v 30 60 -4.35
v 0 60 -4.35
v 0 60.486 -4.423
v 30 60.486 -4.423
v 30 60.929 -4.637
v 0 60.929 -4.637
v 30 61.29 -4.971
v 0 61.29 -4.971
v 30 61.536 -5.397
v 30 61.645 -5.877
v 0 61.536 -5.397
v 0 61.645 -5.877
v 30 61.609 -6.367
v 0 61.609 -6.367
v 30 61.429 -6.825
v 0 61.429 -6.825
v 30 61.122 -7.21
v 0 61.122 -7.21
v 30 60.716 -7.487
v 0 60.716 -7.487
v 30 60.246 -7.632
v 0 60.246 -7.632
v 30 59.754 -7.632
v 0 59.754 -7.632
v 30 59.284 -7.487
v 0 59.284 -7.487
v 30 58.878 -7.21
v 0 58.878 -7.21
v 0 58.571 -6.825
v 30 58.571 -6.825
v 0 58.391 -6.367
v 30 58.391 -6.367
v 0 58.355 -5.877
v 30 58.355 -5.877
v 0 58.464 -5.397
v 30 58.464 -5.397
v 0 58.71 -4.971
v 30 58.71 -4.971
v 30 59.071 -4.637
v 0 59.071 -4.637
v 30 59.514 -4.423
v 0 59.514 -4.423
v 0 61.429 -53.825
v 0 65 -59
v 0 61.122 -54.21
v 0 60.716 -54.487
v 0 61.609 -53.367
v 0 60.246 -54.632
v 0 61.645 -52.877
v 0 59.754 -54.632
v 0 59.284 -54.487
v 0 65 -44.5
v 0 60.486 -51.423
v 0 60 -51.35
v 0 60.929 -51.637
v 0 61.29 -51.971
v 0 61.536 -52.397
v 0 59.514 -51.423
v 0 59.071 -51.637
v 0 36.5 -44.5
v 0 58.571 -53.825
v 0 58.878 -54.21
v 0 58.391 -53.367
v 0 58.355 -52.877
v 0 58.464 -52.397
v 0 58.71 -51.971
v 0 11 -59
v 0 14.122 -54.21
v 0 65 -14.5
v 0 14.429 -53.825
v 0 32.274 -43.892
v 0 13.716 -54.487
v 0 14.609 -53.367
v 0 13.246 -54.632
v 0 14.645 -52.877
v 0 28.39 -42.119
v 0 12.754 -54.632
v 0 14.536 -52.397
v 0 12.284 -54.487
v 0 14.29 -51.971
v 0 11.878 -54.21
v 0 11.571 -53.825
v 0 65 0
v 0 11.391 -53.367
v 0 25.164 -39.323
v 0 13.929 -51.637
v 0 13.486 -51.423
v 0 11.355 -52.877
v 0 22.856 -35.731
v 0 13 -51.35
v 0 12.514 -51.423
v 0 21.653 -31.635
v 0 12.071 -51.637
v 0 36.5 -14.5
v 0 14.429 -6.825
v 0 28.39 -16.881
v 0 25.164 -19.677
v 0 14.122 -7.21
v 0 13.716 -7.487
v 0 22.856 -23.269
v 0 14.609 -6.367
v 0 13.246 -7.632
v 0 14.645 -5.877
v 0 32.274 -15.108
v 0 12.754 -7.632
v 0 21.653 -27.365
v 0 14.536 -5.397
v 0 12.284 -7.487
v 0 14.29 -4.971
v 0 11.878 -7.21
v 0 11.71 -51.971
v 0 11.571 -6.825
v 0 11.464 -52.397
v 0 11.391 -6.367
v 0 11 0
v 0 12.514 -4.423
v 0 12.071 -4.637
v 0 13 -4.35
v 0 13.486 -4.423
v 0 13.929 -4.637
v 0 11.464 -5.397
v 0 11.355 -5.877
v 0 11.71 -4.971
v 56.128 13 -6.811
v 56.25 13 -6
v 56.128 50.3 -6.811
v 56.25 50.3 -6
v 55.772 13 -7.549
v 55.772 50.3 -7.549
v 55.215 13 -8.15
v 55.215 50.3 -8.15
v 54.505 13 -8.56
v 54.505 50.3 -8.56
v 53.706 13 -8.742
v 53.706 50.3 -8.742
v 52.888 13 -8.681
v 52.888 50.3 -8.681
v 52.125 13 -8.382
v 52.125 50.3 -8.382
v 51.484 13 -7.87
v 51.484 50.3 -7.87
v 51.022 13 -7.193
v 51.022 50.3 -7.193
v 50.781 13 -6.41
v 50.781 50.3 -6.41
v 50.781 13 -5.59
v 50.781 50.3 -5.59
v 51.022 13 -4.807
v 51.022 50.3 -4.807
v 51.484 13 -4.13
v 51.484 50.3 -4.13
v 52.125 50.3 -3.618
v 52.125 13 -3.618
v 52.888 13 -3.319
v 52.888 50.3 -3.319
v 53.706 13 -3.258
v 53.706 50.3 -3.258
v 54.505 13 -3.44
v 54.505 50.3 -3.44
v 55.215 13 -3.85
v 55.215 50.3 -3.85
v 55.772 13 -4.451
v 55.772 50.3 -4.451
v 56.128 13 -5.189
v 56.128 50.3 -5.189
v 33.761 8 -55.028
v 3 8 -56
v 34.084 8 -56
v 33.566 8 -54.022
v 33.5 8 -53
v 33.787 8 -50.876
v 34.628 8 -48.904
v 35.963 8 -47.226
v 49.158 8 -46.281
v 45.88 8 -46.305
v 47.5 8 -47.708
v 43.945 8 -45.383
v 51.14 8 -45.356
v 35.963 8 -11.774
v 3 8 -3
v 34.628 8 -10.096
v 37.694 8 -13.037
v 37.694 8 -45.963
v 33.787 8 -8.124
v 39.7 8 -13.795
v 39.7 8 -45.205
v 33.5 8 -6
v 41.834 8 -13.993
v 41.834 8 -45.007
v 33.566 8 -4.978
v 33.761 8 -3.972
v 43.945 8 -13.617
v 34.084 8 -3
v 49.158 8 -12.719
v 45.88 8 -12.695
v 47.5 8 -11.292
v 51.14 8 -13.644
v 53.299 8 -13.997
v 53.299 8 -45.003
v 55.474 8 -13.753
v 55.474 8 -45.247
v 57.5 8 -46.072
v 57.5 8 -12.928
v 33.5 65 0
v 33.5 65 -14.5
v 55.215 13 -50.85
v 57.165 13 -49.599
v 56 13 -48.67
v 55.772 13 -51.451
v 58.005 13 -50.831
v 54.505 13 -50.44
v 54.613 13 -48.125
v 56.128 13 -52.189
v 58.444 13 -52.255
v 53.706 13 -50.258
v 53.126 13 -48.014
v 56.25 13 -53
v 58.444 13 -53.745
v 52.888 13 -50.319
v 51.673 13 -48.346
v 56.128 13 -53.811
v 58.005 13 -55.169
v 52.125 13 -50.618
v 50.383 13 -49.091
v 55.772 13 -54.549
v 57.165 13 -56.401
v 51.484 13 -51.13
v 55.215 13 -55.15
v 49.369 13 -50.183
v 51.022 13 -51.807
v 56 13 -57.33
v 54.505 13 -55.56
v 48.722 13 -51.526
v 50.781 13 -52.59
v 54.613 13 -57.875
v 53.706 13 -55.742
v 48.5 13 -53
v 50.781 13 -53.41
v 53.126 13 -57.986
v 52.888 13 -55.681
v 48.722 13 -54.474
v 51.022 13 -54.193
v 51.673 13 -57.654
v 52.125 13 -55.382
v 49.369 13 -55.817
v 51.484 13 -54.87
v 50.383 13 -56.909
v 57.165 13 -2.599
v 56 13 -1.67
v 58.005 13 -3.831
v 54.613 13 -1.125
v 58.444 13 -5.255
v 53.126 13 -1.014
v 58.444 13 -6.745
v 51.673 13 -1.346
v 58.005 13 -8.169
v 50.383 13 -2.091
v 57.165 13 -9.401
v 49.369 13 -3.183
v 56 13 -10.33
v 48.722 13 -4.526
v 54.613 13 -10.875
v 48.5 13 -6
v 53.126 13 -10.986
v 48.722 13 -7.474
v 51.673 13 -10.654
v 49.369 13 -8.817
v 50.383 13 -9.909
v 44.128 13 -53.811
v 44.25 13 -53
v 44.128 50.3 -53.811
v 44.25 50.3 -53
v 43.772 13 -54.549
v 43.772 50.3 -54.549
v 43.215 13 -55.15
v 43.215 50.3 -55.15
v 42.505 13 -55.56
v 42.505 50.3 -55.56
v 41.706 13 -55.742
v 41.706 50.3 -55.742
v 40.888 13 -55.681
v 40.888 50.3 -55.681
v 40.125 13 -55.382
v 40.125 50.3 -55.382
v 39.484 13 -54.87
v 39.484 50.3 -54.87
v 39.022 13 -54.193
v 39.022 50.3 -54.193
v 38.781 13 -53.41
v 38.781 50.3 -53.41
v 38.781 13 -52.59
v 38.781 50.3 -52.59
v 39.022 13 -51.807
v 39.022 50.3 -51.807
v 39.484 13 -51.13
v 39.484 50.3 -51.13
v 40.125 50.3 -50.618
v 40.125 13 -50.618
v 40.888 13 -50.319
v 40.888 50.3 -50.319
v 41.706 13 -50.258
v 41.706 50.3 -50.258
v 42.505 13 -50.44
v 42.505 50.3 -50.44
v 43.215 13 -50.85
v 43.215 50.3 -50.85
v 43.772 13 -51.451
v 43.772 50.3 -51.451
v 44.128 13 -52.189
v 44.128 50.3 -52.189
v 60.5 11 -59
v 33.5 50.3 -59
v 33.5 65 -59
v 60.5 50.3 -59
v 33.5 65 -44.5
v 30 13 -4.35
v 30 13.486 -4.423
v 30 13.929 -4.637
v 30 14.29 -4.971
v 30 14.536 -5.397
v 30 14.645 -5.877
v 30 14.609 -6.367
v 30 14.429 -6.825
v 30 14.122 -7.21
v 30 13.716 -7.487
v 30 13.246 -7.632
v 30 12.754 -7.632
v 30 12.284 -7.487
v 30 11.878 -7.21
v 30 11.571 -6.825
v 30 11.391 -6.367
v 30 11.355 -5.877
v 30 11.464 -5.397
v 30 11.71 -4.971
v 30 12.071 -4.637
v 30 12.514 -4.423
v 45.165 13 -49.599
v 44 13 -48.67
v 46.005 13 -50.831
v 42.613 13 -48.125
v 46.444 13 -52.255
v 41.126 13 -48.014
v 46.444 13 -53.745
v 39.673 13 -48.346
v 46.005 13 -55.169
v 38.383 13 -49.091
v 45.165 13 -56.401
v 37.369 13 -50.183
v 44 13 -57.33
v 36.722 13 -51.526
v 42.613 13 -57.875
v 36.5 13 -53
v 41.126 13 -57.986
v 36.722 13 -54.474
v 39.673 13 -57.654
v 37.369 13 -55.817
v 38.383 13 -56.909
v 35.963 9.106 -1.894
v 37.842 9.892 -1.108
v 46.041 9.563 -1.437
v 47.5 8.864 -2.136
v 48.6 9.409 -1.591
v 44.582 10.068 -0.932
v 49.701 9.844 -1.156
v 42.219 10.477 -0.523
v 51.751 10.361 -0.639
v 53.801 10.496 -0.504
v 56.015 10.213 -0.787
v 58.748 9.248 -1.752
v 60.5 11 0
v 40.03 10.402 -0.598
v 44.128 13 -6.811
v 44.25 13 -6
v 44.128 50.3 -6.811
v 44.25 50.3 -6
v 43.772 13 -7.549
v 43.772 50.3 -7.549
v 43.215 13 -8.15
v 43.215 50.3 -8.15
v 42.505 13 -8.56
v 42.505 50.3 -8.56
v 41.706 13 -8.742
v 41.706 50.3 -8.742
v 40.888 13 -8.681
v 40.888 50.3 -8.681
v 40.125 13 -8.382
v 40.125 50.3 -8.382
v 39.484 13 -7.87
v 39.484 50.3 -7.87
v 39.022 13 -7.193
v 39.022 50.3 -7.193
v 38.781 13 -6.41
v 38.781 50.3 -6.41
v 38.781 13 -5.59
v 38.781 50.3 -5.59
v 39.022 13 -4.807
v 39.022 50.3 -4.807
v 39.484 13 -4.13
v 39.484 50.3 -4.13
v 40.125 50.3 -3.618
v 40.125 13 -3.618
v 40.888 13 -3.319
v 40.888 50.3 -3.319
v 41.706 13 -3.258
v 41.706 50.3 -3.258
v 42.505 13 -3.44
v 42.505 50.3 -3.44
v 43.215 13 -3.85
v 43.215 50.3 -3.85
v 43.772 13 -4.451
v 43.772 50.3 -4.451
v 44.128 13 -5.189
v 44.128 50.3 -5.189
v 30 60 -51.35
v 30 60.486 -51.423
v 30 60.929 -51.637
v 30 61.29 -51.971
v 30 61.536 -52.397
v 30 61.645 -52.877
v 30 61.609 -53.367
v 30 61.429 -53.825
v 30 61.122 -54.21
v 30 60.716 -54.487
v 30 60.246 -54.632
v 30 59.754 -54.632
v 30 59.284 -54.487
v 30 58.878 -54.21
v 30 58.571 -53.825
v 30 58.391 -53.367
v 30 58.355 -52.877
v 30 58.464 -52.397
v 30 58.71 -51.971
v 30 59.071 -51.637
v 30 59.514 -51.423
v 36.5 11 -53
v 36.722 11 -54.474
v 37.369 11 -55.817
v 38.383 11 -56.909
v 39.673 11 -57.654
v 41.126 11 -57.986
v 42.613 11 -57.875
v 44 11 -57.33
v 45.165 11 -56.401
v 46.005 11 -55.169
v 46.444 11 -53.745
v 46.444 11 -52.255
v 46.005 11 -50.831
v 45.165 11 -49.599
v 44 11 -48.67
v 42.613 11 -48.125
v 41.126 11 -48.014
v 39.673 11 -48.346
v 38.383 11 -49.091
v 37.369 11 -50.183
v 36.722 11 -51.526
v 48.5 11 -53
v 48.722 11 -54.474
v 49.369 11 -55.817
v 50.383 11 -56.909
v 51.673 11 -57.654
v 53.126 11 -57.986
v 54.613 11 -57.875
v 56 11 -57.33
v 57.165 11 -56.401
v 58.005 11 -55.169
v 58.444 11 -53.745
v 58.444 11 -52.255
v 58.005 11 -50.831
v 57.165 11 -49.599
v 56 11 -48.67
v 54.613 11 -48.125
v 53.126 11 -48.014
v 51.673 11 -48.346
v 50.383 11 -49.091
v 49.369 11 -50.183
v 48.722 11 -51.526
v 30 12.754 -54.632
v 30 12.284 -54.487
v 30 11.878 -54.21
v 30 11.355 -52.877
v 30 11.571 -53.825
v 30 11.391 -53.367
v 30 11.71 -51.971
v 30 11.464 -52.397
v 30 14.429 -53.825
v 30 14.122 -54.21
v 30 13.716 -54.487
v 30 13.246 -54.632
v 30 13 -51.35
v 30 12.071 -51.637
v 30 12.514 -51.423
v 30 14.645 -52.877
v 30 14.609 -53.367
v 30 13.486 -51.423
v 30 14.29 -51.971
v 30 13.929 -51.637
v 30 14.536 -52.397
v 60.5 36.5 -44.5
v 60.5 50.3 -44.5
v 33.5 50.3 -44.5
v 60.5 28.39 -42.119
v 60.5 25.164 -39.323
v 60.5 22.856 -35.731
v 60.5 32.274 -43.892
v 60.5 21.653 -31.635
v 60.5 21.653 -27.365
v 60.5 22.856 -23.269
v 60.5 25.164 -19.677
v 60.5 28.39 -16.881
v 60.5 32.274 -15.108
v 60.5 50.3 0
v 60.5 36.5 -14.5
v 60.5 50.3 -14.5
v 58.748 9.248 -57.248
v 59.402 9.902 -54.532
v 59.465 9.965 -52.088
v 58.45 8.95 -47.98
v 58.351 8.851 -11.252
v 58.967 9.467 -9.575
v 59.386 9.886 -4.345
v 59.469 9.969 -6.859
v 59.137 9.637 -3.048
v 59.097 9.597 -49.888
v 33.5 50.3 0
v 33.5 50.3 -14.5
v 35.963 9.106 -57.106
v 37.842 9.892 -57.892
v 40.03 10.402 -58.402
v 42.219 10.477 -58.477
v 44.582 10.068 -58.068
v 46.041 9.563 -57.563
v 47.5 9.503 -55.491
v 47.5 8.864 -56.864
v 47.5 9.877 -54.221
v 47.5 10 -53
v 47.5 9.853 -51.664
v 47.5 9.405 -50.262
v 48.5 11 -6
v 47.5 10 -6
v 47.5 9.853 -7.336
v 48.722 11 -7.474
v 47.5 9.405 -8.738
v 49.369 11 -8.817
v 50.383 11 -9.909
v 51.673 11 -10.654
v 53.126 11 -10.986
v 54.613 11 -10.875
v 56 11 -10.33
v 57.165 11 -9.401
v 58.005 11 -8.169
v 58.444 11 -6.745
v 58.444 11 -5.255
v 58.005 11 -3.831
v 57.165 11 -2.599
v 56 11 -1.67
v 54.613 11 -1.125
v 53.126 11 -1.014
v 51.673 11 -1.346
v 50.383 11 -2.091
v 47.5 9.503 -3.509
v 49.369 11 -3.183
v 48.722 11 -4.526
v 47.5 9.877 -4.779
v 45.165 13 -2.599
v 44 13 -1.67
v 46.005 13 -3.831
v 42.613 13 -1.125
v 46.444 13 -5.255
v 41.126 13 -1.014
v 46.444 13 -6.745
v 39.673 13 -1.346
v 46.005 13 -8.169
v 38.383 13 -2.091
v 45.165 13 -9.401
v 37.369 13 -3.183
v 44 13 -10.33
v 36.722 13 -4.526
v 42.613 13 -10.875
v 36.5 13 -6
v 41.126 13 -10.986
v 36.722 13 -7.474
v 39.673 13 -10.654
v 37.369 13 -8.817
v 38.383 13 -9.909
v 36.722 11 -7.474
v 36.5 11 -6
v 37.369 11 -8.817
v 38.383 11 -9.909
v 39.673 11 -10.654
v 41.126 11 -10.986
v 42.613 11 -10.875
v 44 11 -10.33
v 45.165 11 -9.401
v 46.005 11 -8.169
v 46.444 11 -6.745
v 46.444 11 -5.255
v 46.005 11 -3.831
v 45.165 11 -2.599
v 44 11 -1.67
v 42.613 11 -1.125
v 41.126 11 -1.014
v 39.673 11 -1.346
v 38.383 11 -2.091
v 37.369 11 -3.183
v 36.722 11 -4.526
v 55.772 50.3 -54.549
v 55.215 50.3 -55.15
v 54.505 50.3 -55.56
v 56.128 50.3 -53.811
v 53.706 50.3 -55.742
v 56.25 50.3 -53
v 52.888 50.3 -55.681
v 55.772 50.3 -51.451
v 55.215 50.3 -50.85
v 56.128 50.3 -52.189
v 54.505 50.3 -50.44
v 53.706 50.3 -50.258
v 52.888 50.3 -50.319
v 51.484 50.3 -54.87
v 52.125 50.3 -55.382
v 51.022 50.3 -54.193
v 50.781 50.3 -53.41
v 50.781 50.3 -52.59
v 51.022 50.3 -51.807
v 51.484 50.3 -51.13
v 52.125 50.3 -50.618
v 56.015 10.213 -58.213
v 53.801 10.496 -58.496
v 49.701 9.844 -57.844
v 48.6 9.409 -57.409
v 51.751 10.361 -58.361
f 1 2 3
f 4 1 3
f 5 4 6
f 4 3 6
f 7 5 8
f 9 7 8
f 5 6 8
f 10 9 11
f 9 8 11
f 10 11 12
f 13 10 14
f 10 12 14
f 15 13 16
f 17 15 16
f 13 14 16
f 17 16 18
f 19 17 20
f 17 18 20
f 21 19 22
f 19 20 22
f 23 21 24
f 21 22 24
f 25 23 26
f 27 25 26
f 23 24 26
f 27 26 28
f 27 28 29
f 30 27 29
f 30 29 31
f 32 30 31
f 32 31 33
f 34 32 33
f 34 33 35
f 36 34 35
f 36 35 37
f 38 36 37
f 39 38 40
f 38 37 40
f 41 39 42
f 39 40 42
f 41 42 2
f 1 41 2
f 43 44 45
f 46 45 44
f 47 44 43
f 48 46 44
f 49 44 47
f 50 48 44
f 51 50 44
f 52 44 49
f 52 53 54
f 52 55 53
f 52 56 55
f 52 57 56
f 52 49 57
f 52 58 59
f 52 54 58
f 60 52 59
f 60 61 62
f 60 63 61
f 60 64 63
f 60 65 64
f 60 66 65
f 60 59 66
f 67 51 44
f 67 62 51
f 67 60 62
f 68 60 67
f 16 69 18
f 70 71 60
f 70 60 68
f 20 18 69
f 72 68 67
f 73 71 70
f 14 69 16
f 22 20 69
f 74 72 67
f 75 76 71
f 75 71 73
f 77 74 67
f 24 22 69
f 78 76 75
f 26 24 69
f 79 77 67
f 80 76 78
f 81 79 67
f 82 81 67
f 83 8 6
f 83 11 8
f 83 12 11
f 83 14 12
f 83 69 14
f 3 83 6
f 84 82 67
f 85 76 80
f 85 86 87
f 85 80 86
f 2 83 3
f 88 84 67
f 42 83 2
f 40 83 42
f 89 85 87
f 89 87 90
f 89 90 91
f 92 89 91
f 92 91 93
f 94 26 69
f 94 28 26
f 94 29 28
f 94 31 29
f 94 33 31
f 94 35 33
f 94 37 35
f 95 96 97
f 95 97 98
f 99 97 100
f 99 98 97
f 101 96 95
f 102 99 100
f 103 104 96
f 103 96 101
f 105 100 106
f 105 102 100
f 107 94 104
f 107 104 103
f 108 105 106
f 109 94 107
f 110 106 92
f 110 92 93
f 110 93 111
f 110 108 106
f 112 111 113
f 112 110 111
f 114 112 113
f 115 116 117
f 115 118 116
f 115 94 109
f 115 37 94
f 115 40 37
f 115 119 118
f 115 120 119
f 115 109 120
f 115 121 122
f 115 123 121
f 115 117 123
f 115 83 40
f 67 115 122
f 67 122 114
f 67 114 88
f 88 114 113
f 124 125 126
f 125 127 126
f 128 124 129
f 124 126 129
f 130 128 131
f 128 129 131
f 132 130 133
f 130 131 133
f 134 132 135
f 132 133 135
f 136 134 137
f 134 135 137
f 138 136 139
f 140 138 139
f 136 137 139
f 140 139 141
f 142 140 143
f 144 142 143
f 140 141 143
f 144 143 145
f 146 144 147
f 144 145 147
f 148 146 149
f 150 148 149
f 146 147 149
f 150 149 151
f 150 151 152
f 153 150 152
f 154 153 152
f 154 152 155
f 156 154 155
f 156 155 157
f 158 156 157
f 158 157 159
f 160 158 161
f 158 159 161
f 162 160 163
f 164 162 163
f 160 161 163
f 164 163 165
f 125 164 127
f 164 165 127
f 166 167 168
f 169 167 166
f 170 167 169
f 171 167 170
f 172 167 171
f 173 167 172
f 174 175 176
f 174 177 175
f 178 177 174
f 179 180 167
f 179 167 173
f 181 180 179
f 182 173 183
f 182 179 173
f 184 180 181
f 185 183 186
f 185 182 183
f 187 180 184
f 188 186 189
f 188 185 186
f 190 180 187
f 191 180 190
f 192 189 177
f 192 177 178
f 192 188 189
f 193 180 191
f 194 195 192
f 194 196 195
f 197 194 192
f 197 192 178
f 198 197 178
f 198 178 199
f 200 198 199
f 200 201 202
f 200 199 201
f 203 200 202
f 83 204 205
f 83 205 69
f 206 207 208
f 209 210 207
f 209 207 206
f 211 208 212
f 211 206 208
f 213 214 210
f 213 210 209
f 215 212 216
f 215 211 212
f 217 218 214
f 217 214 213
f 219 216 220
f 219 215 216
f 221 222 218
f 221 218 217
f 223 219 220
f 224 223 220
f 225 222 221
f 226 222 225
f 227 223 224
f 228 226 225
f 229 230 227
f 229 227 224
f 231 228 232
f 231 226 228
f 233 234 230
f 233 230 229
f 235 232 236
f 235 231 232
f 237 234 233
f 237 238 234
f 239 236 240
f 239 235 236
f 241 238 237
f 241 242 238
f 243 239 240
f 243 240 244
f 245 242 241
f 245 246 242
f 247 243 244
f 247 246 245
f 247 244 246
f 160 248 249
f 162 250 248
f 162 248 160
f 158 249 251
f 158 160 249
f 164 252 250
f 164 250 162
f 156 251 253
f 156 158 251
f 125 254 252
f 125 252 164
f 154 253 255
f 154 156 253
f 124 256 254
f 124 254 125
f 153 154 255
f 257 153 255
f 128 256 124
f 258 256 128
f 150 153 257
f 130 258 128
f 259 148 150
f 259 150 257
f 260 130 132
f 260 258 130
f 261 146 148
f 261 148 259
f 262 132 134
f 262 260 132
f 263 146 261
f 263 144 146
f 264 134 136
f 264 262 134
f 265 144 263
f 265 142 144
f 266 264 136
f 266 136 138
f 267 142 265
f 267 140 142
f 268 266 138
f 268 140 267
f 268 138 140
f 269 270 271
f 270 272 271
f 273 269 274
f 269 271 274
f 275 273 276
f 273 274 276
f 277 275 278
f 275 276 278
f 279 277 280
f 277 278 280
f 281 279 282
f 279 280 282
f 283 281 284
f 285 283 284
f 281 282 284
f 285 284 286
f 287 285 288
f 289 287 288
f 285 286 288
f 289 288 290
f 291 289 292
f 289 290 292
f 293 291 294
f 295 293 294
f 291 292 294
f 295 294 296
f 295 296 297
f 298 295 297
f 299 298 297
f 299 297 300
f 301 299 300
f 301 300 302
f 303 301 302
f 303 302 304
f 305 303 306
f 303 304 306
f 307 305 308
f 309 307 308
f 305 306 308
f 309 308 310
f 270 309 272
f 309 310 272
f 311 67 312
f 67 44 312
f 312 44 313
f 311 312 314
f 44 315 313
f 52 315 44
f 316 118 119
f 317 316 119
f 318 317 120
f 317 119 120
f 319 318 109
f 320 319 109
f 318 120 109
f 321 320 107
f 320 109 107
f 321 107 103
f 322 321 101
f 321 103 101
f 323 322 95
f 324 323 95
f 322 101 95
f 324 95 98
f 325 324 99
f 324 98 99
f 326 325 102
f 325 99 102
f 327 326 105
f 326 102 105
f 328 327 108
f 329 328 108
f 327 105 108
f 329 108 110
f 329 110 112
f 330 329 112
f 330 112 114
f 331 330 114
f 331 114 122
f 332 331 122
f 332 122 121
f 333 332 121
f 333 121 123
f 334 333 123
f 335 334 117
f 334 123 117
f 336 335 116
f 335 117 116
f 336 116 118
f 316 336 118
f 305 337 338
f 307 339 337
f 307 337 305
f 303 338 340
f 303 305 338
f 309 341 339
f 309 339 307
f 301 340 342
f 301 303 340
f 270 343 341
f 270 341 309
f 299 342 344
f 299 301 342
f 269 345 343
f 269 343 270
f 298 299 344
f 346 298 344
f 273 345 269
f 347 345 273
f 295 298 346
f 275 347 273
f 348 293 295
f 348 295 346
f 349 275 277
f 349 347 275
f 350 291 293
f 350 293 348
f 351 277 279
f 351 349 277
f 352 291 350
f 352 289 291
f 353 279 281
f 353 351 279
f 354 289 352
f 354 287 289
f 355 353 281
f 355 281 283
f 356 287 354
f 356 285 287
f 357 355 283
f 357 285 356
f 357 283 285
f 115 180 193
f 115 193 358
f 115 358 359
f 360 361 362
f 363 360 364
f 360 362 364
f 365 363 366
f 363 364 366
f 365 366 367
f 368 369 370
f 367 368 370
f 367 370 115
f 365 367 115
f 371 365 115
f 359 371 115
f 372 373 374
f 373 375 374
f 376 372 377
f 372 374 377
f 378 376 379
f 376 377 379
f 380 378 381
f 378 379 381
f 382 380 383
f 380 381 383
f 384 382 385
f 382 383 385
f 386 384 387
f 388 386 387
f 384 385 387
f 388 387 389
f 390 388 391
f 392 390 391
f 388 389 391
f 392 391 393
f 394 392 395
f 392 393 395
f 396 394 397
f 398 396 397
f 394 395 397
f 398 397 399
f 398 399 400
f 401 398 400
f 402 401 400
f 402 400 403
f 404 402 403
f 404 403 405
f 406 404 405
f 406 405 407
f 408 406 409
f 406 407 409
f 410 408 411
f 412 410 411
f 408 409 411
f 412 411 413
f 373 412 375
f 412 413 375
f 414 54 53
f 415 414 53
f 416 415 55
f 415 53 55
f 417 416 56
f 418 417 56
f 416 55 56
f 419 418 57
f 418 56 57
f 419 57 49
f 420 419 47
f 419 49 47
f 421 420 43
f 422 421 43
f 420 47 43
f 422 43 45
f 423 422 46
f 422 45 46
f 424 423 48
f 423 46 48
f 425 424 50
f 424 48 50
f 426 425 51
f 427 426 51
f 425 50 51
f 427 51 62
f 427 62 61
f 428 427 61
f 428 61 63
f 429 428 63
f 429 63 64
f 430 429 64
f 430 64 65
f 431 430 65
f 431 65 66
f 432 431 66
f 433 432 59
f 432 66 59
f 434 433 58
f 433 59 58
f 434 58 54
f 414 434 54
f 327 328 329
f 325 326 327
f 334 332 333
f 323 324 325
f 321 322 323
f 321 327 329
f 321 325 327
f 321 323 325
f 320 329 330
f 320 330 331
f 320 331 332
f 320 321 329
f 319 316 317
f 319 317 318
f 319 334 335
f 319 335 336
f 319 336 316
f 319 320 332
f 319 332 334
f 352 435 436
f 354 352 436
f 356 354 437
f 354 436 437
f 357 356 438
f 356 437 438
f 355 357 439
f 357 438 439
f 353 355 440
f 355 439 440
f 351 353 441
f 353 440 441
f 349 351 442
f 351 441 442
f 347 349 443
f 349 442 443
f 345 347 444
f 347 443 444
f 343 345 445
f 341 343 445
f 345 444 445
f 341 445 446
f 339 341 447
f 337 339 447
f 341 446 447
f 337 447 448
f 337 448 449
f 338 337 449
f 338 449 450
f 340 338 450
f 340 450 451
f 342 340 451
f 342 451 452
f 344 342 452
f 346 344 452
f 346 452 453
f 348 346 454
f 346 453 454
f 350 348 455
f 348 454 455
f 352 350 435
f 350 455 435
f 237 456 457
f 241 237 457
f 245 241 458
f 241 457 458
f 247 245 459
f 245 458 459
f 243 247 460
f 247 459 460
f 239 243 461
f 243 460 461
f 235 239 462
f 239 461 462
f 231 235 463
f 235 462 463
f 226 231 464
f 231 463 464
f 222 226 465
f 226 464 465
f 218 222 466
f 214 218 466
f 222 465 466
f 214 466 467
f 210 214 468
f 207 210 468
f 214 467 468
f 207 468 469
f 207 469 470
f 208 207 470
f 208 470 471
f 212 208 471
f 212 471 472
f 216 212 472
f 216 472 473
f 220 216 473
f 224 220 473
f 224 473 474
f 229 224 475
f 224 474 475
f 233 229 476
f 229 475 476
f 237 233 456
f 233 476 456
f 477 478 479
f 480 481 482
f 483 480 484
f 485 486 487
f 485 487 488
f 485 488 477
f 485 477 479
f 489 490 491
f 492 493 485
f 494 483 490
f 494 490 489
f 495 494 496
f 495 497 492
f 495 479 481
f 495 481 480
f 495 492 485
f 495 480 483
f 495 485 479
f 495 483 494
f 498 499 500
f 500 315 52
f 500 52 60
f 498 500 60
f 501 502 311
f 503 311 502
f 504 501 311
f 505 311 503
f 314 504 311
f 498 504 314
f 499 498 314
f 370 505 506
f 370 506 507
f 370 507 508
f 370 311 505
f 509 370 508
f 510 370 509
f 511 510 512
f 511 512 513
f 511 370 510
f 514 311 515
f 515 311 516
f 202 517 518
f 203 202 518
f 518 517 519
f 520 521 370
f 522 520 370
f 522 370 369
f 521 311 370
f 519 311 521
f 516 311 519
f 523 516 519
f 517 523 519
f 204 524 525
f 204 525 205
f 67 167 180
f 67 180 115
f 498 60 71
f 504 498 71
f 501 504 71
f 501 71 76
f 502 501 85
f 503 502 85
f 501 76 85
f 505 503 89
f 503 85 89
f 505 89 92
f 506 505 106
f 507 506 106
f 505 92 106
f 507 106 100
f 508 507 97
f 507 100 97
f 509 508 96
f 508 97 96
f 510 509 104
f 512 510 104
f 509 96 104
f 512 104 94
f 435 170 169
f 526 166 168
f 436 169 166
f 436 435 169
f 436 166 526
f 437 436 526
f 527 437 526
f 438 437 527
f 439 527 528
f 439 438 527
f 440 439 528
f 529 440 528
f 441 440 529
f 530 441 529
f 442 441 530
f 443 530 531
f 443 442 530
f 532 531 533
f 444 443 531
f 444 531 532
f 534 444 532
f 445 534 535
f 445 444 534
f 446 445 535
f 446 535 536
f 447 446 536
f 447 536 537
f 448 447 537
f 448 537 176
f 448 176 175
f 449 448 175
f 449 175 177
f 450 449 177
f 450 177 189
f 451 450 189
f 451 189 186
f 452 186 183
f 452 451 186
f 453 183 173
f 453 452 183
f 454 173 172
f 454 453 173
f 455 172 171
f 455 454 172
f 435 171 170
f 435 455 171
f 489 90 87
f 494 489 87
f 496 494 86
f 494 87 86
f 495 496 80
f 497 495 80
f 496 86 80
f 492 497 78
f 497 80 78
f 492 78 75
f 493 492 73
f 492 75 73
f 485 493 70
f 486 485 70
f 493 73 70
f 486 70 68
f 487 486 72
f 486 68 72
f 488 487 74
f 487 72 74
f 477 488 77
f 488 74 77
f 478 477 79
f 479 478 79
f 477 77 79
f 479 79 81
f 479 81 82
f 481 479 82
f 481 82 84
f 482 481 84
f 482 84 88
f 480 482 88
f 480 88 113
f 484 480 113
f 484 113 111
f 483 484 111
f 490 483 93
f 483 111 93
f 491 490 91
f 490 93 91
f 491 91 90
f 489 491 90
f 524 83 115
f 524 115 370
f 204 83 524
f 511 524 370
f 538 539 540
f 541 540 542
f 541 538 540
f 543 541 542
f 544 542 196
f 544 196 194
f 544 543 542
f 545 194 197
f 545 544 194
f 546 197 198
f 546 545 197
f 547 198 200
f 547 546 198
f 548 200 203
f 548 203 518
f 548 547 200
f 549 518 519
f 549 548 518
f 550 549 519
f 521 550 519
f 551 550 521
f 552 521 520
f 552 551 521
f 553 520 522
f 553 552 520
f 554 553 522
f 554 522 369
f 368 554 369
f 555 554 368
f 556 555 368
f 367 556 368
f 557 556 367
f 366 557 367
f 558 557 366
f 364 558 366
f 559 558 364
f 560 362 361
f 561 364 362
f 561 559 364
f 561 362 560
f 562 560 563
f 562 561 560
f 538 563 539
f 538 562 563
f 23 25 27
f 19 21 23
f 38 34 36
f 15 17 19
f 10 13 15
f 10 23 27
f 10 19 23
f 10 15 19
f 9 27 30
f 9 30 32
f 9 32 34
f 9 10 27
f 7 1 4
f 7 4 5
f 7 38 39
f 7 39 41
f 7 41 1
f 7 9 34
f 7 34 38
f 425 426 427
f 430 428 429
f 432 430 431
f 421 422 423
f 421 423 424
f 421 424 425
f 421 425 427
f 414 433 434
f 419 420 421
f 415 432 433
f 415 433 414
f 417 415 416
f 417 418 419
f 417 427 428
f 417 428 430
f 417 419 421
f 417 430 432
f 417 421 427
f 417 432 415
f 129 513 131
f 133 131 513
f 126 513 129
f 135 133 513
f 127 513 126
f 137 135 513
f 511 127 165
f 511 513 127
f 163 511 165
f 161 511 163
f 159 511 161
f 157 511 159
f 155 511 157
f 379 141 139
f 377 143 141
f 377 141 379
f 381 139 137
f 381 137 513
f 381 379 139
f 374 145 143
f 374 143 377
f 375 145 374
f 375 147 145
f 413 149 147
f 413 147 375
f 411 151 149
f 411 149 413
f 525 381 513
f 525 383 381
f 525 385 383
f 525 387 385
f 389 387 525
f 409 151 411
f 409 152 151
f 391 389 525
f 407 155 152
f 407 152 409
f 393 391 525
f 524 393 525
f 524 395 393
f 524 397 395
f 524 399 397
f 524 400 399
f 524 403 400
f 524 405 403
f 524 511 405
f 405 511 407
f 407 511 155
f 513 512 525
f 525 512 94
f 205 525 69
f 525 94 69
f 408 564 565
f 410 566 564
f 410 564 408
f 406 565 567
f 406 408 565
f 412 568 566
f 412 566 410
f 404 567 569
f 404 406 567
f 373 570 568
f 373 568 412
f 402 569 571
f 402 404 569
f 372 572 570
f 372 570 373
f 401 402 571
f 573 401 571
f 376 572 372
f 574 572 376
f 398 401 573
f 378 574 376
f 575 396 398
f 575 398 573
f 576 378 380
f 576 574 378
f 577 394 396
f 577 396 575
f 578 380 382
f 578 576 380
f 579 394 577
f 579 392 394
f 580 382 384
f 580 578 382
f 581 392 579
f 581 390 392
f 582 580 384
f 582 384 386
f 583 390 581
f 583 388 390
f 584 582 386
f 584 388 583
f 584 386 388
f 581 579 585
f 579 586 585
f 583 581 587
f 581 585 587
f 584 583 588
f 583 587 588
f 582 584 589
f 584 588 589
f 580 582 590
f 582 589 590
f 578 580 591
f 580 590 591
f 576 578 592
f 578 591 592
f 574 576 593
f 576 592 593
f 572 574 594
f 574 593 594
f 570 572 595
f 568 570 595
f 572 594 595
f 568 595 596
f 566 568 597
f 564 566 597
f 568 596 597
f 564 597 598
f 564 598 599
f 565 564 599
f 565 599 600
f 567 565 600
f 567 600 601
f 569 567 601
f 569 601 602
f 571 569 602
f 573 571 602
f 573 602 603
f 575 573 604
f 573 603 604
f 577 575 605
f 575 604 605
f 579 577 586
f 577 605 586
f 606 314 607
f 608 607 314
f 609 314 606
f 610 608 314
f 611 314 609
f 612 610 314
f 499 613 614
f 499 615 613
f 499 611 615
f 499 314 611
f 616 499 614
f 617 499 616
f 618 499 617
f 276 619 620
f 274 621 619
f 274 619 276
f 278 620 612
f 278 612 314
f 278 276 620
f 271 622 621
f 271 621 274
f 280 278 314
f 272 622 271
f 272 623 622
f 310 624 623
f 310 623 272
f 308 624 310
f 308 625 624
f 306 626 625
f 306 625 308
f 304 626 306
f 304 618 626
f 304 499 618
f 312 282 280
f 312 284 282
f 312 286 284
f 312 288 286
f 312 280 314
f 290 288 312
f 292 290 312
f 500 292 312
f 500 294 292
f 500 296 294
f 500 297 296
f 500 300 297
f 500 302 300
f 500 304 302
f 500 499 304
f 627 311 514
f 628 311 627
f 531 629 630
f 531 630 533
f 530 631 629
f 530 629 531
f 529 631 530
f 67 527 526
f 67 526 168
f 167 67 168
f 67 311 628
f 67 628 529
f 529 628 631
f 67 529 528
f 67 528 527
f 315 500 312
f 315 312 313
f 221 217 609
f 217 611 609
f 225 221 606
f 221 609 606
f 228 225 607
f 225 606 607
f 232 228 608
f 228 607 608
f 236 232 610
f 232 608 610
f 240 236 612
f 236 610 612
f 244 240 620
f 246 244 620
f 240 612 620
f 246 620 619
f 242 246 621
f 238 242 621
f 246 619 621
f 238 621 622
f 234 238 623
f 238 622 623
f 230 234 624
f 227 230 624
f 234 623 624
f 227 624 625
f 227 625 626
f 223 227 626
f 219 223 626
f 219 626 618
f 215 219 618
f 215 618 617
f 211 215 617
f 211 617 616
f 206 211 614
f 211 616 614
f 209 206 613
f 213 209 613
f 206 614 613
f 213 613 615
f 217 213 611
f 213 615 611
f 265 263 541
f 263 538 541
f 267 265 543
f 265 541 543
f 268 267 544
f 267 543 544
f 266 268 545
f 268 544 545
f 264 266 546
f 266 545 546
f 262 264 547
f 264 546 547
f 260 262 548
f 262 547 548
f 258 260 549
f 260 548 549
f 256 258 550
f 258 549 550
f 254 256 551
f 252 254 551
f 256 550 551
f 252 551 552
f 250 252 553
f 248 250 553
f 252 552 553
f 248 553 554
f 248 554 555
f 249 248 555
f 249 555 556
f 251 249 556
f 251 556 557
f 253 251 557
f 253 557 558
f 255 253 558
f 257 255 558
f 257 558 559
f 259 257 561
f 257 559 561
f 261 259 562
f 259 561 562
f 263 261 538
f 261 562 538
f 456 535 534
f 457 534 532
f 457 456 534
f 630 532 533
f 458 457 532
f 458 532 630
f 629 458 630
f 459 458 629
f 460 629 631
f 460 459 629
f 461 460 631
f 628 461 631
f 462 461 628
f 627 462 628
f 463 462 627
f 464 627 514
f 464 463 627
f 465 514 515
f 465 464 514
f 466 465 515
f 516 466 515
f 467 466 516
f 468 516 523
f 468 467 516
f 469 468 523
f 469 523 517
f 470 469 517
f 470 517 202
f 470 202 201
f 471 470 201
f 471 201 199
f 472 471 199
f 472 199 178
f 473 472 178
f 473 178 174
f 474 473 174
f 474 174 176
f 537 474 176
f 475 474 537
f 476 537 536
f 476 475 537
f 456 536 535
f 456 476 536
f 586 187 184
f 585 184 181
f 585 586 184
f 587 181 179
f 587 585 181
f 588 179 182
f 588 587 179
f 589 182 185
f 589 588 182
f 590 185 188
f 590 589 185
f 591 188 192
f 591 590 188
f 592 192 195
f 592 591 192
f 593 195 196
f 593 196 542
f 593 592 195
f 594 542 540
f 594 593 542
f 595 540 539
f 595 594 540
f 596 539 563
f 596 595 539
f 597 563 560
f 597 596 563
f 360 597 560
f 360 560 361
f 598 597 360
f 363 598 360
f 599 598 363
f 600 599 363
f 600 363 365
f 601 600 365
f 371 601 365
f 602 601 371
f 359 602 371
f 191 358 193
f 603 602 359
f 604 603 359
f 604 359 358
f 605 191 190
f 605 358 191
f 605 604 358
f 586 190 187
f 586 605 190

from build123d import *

# Parameters (mm, degrees)
BOSS_EXTRUDE1_DEPTH            = 59
SKETCH2_R                      = 1.65
CUT_EXTRUDE1_DEPTH             = 30
CBORE_FOR_M5_SHCS1_D           = 5.5
CBORE_FOR_M5_SHCS1_DEPTH       = 98.347633298
CBORE_FOR_M5_SHCS1_CBORE_D     = 10
CBORE_FOR_M5_SHCS1_CBORE_DEPTH = 5
CBORE_FOR_M5_SHCS1_TIP         = 1.652366702
CUT_EXTRUDE2_DEPTH             = 107.612616514
CHAMFER1_SIZE                  = 3


with BuildPart() as part:
    # Sketch1 → Boss-Extrude1 (new body)
    with BuildSketch(Plane.XY):
        Polygon((60.5, 22.7), (60.5, 50.3), (58.5, 50.3), (33.5, 50.3), (33.5, 65), (10, 65), (0, 65), (0, 8), (10, 8), (33.5, 8), (60.5, 8), align=None)
    extrude(amount=-BOSS_EXTRUDE1_DEPTH)

    # Sketch2 → Cut-Extrude1 (cut)
    with BuildSketch(Plane.ZY):
        with Locations((-6, 13)):
            Circle(SKETCH2_R)
        with Locations((-6, 60)):
            Circle(SKETCH2_R)
        with Locations((-53, 13)):
            Circle(SKETCH2_R)
        with Locations((-53, 60)):
            Circle(SKETCH2_R)
    extrude(amount=-CUT_EXTRUDE1_DEPTH, mode=Mode.SUBTRACT)

    # CBORE for M5 SHCS1
    with Locations(Plane(origin=(0, 8, 0), x_dir=(-1, 0, 0), z_dir=(0, -1, 0))):
        with Locations((-53.5, 6), (-41.5, 6), (-41.5, 53), (-53.5, 53)):
            CounterBoreHole(CBORE_FOR_M5_SHCS1_D / 2, CBORE_FOR_M5_SHCS1_CBORE_D / 2, CBORE_FOR_M5_SHCS1_CBORE_DEPTH, depth=CBORE_FOR_M5_SHCS1_DEPTH)
            with Locations((0, 0, -(CBORE_FOR_M5_SHCS1_DEPTH + CBORE_FOR_M5_SHCS1_TIP / 2))):  # 118° drill point
                Cone(0, CBORE_FOR_M5_SHCS1_D / 2, CBORE_FOR_M5_SHCS1_TIP, mode=Mode.SUBTRACT)

    # Sketch7 → Cut-Extrude2 (cut, through all)
    with BuildSketch(Plane.ZY):
        with BuildLine():
            Line((-14.5, 36.5), (-14.5, 65))
            Line((-14.5, 65), (-44.5, 65))
            Line((-44.5, 65), (-44.5, 36.5))
            ThreePointArc((-44.5, 36.5), (-29.5, 21.5), (-14.5, 36.5))
        make_face()
    extrude(amount=-CUT_EXTRUDE2_DEPTH, mode=Mode.SUBTRACT)

    # Chamfer1
    # the kernel refuses this chamfer: 3 mm, written as the material it takes off along each edge
    with BuildSketch(Plane(origin=(68.215048964, 8, 0), x_dir=(0, -0.02749587661058649, -0.9996219169112968), z_dir=(-1, 0, 0))) as chamfer1_piece_1:
        Polygon((CHAMFER1_SIZE * 0.999621916911, -CHAMFER1_SIZE * 0.0274958766106), (-CHAMFER1_SIZE * 0.0274958766106, -CHAMFER1_SIZE * 0.999621916911), (0, 0), align=None)
    extrude(amount=75.930097928, mode=Mode.SUBTRACT)
    with BuildSketch(Plane(origin=(60.5, 8, 7.715048964), x_dir=(0.02749587661058678, 0.9996219169112968, 0), z_dir=(0, 0, -1)), Plane(origin=(0, 8, 7.715048964), x_dir=(0.9996219169112968, -0.02749587661058649, 0), z_dir=(0, 0, -1))) as chamfer1_piece_2:
        Polygon((CHAMFER1_SIZE * 0.999621916911, -CHAMFER1_SIZE * 0.0274958766106), (-CHAMFER1_SIZE * 0.0274958766106, -CHAMFER1_SIZE * 0.999621916911), (0, 0), align=None)
    extrude(amount=74.430097928, mode=Mode.SUBTRACT)
    with BuildSketch(Plane(origin=(-7.715048964, 8, -59), x_dir=(0, 0.9996219169112968, -0.02749587661058678), z_dir=(1, 0, 0))) as chamfer1_piece_3:
        Polygon((CHAMFER1_SIZE * 0.999621916911, CHAMFER1_SIZE * 0.0274958766106), (-CHAMFER1_SIZE * 0.0274958766106, CHAMFER1_SIZE * 0.999621916911), (0, 0), align=None)
    extrude(amount=75.930097928, mode=Mode.SUBTRACT)
    with BuildSketch(Plane(origin=(53.5, 8, -53), x_dir=(-1, 0, 0), z_dir=(0, 0, 1))) as chamfer1_piece_4:
        Polygon((5 + CHAMFER1_SIZE, 0), (5, -CHAMFER1_SIZE), (5, 0), align=None)
    revolve(axis=Axis((53.5, 8, -53), (0, -1, 0)), mode=Mode.SUBTRACT)
    with BuildSketch(Plane(origin=(41.5, 8, -53), x_dir=(-1, 0, 0), z_dir=(0, 0, 1))) as chamfer1_piece_5:
        Polygon((5 + CHAMFER1_SIZE, 0), (5, -CHAMFER1_SIZE), (5, 0), align=None)
    revolve(axis=Axis((41.5, 8, -53), (0, -1, 0)), mode=Mode.SUBTRACT)
    with BuildSketch(Plane(origin=(41.5, 8, -6), x_dir=(-1, 0, 0), z_dir=(0, 0, 1))) as chamfer1_piece_6:
        Polygon((5 + CHAMFER1_SIZE, 0), (5, -CHAMFER1_SIZE), (5, 0), align=None)
    revolve(axis=Axis((41.5, 8, -6), (0, -1, 0)), mode=Mode.SUBTRACT)
    with BuildSketch(Plane(origin=(53.5, 8, -6), x_dir=(-1, 0, 0), z_dir=(0, 0, 1))) as chamfer1_piece_7:
        Polygon((5 + CHAMFER1_SIZE, 0), (5, -CHAMFER1_SIZE), (5, 0), align=None)
    revolve(axis=Axis((53.5, 8, -6), (0, -1, 0)), mode=Mode.SUBTRACT)


solid = part.part
